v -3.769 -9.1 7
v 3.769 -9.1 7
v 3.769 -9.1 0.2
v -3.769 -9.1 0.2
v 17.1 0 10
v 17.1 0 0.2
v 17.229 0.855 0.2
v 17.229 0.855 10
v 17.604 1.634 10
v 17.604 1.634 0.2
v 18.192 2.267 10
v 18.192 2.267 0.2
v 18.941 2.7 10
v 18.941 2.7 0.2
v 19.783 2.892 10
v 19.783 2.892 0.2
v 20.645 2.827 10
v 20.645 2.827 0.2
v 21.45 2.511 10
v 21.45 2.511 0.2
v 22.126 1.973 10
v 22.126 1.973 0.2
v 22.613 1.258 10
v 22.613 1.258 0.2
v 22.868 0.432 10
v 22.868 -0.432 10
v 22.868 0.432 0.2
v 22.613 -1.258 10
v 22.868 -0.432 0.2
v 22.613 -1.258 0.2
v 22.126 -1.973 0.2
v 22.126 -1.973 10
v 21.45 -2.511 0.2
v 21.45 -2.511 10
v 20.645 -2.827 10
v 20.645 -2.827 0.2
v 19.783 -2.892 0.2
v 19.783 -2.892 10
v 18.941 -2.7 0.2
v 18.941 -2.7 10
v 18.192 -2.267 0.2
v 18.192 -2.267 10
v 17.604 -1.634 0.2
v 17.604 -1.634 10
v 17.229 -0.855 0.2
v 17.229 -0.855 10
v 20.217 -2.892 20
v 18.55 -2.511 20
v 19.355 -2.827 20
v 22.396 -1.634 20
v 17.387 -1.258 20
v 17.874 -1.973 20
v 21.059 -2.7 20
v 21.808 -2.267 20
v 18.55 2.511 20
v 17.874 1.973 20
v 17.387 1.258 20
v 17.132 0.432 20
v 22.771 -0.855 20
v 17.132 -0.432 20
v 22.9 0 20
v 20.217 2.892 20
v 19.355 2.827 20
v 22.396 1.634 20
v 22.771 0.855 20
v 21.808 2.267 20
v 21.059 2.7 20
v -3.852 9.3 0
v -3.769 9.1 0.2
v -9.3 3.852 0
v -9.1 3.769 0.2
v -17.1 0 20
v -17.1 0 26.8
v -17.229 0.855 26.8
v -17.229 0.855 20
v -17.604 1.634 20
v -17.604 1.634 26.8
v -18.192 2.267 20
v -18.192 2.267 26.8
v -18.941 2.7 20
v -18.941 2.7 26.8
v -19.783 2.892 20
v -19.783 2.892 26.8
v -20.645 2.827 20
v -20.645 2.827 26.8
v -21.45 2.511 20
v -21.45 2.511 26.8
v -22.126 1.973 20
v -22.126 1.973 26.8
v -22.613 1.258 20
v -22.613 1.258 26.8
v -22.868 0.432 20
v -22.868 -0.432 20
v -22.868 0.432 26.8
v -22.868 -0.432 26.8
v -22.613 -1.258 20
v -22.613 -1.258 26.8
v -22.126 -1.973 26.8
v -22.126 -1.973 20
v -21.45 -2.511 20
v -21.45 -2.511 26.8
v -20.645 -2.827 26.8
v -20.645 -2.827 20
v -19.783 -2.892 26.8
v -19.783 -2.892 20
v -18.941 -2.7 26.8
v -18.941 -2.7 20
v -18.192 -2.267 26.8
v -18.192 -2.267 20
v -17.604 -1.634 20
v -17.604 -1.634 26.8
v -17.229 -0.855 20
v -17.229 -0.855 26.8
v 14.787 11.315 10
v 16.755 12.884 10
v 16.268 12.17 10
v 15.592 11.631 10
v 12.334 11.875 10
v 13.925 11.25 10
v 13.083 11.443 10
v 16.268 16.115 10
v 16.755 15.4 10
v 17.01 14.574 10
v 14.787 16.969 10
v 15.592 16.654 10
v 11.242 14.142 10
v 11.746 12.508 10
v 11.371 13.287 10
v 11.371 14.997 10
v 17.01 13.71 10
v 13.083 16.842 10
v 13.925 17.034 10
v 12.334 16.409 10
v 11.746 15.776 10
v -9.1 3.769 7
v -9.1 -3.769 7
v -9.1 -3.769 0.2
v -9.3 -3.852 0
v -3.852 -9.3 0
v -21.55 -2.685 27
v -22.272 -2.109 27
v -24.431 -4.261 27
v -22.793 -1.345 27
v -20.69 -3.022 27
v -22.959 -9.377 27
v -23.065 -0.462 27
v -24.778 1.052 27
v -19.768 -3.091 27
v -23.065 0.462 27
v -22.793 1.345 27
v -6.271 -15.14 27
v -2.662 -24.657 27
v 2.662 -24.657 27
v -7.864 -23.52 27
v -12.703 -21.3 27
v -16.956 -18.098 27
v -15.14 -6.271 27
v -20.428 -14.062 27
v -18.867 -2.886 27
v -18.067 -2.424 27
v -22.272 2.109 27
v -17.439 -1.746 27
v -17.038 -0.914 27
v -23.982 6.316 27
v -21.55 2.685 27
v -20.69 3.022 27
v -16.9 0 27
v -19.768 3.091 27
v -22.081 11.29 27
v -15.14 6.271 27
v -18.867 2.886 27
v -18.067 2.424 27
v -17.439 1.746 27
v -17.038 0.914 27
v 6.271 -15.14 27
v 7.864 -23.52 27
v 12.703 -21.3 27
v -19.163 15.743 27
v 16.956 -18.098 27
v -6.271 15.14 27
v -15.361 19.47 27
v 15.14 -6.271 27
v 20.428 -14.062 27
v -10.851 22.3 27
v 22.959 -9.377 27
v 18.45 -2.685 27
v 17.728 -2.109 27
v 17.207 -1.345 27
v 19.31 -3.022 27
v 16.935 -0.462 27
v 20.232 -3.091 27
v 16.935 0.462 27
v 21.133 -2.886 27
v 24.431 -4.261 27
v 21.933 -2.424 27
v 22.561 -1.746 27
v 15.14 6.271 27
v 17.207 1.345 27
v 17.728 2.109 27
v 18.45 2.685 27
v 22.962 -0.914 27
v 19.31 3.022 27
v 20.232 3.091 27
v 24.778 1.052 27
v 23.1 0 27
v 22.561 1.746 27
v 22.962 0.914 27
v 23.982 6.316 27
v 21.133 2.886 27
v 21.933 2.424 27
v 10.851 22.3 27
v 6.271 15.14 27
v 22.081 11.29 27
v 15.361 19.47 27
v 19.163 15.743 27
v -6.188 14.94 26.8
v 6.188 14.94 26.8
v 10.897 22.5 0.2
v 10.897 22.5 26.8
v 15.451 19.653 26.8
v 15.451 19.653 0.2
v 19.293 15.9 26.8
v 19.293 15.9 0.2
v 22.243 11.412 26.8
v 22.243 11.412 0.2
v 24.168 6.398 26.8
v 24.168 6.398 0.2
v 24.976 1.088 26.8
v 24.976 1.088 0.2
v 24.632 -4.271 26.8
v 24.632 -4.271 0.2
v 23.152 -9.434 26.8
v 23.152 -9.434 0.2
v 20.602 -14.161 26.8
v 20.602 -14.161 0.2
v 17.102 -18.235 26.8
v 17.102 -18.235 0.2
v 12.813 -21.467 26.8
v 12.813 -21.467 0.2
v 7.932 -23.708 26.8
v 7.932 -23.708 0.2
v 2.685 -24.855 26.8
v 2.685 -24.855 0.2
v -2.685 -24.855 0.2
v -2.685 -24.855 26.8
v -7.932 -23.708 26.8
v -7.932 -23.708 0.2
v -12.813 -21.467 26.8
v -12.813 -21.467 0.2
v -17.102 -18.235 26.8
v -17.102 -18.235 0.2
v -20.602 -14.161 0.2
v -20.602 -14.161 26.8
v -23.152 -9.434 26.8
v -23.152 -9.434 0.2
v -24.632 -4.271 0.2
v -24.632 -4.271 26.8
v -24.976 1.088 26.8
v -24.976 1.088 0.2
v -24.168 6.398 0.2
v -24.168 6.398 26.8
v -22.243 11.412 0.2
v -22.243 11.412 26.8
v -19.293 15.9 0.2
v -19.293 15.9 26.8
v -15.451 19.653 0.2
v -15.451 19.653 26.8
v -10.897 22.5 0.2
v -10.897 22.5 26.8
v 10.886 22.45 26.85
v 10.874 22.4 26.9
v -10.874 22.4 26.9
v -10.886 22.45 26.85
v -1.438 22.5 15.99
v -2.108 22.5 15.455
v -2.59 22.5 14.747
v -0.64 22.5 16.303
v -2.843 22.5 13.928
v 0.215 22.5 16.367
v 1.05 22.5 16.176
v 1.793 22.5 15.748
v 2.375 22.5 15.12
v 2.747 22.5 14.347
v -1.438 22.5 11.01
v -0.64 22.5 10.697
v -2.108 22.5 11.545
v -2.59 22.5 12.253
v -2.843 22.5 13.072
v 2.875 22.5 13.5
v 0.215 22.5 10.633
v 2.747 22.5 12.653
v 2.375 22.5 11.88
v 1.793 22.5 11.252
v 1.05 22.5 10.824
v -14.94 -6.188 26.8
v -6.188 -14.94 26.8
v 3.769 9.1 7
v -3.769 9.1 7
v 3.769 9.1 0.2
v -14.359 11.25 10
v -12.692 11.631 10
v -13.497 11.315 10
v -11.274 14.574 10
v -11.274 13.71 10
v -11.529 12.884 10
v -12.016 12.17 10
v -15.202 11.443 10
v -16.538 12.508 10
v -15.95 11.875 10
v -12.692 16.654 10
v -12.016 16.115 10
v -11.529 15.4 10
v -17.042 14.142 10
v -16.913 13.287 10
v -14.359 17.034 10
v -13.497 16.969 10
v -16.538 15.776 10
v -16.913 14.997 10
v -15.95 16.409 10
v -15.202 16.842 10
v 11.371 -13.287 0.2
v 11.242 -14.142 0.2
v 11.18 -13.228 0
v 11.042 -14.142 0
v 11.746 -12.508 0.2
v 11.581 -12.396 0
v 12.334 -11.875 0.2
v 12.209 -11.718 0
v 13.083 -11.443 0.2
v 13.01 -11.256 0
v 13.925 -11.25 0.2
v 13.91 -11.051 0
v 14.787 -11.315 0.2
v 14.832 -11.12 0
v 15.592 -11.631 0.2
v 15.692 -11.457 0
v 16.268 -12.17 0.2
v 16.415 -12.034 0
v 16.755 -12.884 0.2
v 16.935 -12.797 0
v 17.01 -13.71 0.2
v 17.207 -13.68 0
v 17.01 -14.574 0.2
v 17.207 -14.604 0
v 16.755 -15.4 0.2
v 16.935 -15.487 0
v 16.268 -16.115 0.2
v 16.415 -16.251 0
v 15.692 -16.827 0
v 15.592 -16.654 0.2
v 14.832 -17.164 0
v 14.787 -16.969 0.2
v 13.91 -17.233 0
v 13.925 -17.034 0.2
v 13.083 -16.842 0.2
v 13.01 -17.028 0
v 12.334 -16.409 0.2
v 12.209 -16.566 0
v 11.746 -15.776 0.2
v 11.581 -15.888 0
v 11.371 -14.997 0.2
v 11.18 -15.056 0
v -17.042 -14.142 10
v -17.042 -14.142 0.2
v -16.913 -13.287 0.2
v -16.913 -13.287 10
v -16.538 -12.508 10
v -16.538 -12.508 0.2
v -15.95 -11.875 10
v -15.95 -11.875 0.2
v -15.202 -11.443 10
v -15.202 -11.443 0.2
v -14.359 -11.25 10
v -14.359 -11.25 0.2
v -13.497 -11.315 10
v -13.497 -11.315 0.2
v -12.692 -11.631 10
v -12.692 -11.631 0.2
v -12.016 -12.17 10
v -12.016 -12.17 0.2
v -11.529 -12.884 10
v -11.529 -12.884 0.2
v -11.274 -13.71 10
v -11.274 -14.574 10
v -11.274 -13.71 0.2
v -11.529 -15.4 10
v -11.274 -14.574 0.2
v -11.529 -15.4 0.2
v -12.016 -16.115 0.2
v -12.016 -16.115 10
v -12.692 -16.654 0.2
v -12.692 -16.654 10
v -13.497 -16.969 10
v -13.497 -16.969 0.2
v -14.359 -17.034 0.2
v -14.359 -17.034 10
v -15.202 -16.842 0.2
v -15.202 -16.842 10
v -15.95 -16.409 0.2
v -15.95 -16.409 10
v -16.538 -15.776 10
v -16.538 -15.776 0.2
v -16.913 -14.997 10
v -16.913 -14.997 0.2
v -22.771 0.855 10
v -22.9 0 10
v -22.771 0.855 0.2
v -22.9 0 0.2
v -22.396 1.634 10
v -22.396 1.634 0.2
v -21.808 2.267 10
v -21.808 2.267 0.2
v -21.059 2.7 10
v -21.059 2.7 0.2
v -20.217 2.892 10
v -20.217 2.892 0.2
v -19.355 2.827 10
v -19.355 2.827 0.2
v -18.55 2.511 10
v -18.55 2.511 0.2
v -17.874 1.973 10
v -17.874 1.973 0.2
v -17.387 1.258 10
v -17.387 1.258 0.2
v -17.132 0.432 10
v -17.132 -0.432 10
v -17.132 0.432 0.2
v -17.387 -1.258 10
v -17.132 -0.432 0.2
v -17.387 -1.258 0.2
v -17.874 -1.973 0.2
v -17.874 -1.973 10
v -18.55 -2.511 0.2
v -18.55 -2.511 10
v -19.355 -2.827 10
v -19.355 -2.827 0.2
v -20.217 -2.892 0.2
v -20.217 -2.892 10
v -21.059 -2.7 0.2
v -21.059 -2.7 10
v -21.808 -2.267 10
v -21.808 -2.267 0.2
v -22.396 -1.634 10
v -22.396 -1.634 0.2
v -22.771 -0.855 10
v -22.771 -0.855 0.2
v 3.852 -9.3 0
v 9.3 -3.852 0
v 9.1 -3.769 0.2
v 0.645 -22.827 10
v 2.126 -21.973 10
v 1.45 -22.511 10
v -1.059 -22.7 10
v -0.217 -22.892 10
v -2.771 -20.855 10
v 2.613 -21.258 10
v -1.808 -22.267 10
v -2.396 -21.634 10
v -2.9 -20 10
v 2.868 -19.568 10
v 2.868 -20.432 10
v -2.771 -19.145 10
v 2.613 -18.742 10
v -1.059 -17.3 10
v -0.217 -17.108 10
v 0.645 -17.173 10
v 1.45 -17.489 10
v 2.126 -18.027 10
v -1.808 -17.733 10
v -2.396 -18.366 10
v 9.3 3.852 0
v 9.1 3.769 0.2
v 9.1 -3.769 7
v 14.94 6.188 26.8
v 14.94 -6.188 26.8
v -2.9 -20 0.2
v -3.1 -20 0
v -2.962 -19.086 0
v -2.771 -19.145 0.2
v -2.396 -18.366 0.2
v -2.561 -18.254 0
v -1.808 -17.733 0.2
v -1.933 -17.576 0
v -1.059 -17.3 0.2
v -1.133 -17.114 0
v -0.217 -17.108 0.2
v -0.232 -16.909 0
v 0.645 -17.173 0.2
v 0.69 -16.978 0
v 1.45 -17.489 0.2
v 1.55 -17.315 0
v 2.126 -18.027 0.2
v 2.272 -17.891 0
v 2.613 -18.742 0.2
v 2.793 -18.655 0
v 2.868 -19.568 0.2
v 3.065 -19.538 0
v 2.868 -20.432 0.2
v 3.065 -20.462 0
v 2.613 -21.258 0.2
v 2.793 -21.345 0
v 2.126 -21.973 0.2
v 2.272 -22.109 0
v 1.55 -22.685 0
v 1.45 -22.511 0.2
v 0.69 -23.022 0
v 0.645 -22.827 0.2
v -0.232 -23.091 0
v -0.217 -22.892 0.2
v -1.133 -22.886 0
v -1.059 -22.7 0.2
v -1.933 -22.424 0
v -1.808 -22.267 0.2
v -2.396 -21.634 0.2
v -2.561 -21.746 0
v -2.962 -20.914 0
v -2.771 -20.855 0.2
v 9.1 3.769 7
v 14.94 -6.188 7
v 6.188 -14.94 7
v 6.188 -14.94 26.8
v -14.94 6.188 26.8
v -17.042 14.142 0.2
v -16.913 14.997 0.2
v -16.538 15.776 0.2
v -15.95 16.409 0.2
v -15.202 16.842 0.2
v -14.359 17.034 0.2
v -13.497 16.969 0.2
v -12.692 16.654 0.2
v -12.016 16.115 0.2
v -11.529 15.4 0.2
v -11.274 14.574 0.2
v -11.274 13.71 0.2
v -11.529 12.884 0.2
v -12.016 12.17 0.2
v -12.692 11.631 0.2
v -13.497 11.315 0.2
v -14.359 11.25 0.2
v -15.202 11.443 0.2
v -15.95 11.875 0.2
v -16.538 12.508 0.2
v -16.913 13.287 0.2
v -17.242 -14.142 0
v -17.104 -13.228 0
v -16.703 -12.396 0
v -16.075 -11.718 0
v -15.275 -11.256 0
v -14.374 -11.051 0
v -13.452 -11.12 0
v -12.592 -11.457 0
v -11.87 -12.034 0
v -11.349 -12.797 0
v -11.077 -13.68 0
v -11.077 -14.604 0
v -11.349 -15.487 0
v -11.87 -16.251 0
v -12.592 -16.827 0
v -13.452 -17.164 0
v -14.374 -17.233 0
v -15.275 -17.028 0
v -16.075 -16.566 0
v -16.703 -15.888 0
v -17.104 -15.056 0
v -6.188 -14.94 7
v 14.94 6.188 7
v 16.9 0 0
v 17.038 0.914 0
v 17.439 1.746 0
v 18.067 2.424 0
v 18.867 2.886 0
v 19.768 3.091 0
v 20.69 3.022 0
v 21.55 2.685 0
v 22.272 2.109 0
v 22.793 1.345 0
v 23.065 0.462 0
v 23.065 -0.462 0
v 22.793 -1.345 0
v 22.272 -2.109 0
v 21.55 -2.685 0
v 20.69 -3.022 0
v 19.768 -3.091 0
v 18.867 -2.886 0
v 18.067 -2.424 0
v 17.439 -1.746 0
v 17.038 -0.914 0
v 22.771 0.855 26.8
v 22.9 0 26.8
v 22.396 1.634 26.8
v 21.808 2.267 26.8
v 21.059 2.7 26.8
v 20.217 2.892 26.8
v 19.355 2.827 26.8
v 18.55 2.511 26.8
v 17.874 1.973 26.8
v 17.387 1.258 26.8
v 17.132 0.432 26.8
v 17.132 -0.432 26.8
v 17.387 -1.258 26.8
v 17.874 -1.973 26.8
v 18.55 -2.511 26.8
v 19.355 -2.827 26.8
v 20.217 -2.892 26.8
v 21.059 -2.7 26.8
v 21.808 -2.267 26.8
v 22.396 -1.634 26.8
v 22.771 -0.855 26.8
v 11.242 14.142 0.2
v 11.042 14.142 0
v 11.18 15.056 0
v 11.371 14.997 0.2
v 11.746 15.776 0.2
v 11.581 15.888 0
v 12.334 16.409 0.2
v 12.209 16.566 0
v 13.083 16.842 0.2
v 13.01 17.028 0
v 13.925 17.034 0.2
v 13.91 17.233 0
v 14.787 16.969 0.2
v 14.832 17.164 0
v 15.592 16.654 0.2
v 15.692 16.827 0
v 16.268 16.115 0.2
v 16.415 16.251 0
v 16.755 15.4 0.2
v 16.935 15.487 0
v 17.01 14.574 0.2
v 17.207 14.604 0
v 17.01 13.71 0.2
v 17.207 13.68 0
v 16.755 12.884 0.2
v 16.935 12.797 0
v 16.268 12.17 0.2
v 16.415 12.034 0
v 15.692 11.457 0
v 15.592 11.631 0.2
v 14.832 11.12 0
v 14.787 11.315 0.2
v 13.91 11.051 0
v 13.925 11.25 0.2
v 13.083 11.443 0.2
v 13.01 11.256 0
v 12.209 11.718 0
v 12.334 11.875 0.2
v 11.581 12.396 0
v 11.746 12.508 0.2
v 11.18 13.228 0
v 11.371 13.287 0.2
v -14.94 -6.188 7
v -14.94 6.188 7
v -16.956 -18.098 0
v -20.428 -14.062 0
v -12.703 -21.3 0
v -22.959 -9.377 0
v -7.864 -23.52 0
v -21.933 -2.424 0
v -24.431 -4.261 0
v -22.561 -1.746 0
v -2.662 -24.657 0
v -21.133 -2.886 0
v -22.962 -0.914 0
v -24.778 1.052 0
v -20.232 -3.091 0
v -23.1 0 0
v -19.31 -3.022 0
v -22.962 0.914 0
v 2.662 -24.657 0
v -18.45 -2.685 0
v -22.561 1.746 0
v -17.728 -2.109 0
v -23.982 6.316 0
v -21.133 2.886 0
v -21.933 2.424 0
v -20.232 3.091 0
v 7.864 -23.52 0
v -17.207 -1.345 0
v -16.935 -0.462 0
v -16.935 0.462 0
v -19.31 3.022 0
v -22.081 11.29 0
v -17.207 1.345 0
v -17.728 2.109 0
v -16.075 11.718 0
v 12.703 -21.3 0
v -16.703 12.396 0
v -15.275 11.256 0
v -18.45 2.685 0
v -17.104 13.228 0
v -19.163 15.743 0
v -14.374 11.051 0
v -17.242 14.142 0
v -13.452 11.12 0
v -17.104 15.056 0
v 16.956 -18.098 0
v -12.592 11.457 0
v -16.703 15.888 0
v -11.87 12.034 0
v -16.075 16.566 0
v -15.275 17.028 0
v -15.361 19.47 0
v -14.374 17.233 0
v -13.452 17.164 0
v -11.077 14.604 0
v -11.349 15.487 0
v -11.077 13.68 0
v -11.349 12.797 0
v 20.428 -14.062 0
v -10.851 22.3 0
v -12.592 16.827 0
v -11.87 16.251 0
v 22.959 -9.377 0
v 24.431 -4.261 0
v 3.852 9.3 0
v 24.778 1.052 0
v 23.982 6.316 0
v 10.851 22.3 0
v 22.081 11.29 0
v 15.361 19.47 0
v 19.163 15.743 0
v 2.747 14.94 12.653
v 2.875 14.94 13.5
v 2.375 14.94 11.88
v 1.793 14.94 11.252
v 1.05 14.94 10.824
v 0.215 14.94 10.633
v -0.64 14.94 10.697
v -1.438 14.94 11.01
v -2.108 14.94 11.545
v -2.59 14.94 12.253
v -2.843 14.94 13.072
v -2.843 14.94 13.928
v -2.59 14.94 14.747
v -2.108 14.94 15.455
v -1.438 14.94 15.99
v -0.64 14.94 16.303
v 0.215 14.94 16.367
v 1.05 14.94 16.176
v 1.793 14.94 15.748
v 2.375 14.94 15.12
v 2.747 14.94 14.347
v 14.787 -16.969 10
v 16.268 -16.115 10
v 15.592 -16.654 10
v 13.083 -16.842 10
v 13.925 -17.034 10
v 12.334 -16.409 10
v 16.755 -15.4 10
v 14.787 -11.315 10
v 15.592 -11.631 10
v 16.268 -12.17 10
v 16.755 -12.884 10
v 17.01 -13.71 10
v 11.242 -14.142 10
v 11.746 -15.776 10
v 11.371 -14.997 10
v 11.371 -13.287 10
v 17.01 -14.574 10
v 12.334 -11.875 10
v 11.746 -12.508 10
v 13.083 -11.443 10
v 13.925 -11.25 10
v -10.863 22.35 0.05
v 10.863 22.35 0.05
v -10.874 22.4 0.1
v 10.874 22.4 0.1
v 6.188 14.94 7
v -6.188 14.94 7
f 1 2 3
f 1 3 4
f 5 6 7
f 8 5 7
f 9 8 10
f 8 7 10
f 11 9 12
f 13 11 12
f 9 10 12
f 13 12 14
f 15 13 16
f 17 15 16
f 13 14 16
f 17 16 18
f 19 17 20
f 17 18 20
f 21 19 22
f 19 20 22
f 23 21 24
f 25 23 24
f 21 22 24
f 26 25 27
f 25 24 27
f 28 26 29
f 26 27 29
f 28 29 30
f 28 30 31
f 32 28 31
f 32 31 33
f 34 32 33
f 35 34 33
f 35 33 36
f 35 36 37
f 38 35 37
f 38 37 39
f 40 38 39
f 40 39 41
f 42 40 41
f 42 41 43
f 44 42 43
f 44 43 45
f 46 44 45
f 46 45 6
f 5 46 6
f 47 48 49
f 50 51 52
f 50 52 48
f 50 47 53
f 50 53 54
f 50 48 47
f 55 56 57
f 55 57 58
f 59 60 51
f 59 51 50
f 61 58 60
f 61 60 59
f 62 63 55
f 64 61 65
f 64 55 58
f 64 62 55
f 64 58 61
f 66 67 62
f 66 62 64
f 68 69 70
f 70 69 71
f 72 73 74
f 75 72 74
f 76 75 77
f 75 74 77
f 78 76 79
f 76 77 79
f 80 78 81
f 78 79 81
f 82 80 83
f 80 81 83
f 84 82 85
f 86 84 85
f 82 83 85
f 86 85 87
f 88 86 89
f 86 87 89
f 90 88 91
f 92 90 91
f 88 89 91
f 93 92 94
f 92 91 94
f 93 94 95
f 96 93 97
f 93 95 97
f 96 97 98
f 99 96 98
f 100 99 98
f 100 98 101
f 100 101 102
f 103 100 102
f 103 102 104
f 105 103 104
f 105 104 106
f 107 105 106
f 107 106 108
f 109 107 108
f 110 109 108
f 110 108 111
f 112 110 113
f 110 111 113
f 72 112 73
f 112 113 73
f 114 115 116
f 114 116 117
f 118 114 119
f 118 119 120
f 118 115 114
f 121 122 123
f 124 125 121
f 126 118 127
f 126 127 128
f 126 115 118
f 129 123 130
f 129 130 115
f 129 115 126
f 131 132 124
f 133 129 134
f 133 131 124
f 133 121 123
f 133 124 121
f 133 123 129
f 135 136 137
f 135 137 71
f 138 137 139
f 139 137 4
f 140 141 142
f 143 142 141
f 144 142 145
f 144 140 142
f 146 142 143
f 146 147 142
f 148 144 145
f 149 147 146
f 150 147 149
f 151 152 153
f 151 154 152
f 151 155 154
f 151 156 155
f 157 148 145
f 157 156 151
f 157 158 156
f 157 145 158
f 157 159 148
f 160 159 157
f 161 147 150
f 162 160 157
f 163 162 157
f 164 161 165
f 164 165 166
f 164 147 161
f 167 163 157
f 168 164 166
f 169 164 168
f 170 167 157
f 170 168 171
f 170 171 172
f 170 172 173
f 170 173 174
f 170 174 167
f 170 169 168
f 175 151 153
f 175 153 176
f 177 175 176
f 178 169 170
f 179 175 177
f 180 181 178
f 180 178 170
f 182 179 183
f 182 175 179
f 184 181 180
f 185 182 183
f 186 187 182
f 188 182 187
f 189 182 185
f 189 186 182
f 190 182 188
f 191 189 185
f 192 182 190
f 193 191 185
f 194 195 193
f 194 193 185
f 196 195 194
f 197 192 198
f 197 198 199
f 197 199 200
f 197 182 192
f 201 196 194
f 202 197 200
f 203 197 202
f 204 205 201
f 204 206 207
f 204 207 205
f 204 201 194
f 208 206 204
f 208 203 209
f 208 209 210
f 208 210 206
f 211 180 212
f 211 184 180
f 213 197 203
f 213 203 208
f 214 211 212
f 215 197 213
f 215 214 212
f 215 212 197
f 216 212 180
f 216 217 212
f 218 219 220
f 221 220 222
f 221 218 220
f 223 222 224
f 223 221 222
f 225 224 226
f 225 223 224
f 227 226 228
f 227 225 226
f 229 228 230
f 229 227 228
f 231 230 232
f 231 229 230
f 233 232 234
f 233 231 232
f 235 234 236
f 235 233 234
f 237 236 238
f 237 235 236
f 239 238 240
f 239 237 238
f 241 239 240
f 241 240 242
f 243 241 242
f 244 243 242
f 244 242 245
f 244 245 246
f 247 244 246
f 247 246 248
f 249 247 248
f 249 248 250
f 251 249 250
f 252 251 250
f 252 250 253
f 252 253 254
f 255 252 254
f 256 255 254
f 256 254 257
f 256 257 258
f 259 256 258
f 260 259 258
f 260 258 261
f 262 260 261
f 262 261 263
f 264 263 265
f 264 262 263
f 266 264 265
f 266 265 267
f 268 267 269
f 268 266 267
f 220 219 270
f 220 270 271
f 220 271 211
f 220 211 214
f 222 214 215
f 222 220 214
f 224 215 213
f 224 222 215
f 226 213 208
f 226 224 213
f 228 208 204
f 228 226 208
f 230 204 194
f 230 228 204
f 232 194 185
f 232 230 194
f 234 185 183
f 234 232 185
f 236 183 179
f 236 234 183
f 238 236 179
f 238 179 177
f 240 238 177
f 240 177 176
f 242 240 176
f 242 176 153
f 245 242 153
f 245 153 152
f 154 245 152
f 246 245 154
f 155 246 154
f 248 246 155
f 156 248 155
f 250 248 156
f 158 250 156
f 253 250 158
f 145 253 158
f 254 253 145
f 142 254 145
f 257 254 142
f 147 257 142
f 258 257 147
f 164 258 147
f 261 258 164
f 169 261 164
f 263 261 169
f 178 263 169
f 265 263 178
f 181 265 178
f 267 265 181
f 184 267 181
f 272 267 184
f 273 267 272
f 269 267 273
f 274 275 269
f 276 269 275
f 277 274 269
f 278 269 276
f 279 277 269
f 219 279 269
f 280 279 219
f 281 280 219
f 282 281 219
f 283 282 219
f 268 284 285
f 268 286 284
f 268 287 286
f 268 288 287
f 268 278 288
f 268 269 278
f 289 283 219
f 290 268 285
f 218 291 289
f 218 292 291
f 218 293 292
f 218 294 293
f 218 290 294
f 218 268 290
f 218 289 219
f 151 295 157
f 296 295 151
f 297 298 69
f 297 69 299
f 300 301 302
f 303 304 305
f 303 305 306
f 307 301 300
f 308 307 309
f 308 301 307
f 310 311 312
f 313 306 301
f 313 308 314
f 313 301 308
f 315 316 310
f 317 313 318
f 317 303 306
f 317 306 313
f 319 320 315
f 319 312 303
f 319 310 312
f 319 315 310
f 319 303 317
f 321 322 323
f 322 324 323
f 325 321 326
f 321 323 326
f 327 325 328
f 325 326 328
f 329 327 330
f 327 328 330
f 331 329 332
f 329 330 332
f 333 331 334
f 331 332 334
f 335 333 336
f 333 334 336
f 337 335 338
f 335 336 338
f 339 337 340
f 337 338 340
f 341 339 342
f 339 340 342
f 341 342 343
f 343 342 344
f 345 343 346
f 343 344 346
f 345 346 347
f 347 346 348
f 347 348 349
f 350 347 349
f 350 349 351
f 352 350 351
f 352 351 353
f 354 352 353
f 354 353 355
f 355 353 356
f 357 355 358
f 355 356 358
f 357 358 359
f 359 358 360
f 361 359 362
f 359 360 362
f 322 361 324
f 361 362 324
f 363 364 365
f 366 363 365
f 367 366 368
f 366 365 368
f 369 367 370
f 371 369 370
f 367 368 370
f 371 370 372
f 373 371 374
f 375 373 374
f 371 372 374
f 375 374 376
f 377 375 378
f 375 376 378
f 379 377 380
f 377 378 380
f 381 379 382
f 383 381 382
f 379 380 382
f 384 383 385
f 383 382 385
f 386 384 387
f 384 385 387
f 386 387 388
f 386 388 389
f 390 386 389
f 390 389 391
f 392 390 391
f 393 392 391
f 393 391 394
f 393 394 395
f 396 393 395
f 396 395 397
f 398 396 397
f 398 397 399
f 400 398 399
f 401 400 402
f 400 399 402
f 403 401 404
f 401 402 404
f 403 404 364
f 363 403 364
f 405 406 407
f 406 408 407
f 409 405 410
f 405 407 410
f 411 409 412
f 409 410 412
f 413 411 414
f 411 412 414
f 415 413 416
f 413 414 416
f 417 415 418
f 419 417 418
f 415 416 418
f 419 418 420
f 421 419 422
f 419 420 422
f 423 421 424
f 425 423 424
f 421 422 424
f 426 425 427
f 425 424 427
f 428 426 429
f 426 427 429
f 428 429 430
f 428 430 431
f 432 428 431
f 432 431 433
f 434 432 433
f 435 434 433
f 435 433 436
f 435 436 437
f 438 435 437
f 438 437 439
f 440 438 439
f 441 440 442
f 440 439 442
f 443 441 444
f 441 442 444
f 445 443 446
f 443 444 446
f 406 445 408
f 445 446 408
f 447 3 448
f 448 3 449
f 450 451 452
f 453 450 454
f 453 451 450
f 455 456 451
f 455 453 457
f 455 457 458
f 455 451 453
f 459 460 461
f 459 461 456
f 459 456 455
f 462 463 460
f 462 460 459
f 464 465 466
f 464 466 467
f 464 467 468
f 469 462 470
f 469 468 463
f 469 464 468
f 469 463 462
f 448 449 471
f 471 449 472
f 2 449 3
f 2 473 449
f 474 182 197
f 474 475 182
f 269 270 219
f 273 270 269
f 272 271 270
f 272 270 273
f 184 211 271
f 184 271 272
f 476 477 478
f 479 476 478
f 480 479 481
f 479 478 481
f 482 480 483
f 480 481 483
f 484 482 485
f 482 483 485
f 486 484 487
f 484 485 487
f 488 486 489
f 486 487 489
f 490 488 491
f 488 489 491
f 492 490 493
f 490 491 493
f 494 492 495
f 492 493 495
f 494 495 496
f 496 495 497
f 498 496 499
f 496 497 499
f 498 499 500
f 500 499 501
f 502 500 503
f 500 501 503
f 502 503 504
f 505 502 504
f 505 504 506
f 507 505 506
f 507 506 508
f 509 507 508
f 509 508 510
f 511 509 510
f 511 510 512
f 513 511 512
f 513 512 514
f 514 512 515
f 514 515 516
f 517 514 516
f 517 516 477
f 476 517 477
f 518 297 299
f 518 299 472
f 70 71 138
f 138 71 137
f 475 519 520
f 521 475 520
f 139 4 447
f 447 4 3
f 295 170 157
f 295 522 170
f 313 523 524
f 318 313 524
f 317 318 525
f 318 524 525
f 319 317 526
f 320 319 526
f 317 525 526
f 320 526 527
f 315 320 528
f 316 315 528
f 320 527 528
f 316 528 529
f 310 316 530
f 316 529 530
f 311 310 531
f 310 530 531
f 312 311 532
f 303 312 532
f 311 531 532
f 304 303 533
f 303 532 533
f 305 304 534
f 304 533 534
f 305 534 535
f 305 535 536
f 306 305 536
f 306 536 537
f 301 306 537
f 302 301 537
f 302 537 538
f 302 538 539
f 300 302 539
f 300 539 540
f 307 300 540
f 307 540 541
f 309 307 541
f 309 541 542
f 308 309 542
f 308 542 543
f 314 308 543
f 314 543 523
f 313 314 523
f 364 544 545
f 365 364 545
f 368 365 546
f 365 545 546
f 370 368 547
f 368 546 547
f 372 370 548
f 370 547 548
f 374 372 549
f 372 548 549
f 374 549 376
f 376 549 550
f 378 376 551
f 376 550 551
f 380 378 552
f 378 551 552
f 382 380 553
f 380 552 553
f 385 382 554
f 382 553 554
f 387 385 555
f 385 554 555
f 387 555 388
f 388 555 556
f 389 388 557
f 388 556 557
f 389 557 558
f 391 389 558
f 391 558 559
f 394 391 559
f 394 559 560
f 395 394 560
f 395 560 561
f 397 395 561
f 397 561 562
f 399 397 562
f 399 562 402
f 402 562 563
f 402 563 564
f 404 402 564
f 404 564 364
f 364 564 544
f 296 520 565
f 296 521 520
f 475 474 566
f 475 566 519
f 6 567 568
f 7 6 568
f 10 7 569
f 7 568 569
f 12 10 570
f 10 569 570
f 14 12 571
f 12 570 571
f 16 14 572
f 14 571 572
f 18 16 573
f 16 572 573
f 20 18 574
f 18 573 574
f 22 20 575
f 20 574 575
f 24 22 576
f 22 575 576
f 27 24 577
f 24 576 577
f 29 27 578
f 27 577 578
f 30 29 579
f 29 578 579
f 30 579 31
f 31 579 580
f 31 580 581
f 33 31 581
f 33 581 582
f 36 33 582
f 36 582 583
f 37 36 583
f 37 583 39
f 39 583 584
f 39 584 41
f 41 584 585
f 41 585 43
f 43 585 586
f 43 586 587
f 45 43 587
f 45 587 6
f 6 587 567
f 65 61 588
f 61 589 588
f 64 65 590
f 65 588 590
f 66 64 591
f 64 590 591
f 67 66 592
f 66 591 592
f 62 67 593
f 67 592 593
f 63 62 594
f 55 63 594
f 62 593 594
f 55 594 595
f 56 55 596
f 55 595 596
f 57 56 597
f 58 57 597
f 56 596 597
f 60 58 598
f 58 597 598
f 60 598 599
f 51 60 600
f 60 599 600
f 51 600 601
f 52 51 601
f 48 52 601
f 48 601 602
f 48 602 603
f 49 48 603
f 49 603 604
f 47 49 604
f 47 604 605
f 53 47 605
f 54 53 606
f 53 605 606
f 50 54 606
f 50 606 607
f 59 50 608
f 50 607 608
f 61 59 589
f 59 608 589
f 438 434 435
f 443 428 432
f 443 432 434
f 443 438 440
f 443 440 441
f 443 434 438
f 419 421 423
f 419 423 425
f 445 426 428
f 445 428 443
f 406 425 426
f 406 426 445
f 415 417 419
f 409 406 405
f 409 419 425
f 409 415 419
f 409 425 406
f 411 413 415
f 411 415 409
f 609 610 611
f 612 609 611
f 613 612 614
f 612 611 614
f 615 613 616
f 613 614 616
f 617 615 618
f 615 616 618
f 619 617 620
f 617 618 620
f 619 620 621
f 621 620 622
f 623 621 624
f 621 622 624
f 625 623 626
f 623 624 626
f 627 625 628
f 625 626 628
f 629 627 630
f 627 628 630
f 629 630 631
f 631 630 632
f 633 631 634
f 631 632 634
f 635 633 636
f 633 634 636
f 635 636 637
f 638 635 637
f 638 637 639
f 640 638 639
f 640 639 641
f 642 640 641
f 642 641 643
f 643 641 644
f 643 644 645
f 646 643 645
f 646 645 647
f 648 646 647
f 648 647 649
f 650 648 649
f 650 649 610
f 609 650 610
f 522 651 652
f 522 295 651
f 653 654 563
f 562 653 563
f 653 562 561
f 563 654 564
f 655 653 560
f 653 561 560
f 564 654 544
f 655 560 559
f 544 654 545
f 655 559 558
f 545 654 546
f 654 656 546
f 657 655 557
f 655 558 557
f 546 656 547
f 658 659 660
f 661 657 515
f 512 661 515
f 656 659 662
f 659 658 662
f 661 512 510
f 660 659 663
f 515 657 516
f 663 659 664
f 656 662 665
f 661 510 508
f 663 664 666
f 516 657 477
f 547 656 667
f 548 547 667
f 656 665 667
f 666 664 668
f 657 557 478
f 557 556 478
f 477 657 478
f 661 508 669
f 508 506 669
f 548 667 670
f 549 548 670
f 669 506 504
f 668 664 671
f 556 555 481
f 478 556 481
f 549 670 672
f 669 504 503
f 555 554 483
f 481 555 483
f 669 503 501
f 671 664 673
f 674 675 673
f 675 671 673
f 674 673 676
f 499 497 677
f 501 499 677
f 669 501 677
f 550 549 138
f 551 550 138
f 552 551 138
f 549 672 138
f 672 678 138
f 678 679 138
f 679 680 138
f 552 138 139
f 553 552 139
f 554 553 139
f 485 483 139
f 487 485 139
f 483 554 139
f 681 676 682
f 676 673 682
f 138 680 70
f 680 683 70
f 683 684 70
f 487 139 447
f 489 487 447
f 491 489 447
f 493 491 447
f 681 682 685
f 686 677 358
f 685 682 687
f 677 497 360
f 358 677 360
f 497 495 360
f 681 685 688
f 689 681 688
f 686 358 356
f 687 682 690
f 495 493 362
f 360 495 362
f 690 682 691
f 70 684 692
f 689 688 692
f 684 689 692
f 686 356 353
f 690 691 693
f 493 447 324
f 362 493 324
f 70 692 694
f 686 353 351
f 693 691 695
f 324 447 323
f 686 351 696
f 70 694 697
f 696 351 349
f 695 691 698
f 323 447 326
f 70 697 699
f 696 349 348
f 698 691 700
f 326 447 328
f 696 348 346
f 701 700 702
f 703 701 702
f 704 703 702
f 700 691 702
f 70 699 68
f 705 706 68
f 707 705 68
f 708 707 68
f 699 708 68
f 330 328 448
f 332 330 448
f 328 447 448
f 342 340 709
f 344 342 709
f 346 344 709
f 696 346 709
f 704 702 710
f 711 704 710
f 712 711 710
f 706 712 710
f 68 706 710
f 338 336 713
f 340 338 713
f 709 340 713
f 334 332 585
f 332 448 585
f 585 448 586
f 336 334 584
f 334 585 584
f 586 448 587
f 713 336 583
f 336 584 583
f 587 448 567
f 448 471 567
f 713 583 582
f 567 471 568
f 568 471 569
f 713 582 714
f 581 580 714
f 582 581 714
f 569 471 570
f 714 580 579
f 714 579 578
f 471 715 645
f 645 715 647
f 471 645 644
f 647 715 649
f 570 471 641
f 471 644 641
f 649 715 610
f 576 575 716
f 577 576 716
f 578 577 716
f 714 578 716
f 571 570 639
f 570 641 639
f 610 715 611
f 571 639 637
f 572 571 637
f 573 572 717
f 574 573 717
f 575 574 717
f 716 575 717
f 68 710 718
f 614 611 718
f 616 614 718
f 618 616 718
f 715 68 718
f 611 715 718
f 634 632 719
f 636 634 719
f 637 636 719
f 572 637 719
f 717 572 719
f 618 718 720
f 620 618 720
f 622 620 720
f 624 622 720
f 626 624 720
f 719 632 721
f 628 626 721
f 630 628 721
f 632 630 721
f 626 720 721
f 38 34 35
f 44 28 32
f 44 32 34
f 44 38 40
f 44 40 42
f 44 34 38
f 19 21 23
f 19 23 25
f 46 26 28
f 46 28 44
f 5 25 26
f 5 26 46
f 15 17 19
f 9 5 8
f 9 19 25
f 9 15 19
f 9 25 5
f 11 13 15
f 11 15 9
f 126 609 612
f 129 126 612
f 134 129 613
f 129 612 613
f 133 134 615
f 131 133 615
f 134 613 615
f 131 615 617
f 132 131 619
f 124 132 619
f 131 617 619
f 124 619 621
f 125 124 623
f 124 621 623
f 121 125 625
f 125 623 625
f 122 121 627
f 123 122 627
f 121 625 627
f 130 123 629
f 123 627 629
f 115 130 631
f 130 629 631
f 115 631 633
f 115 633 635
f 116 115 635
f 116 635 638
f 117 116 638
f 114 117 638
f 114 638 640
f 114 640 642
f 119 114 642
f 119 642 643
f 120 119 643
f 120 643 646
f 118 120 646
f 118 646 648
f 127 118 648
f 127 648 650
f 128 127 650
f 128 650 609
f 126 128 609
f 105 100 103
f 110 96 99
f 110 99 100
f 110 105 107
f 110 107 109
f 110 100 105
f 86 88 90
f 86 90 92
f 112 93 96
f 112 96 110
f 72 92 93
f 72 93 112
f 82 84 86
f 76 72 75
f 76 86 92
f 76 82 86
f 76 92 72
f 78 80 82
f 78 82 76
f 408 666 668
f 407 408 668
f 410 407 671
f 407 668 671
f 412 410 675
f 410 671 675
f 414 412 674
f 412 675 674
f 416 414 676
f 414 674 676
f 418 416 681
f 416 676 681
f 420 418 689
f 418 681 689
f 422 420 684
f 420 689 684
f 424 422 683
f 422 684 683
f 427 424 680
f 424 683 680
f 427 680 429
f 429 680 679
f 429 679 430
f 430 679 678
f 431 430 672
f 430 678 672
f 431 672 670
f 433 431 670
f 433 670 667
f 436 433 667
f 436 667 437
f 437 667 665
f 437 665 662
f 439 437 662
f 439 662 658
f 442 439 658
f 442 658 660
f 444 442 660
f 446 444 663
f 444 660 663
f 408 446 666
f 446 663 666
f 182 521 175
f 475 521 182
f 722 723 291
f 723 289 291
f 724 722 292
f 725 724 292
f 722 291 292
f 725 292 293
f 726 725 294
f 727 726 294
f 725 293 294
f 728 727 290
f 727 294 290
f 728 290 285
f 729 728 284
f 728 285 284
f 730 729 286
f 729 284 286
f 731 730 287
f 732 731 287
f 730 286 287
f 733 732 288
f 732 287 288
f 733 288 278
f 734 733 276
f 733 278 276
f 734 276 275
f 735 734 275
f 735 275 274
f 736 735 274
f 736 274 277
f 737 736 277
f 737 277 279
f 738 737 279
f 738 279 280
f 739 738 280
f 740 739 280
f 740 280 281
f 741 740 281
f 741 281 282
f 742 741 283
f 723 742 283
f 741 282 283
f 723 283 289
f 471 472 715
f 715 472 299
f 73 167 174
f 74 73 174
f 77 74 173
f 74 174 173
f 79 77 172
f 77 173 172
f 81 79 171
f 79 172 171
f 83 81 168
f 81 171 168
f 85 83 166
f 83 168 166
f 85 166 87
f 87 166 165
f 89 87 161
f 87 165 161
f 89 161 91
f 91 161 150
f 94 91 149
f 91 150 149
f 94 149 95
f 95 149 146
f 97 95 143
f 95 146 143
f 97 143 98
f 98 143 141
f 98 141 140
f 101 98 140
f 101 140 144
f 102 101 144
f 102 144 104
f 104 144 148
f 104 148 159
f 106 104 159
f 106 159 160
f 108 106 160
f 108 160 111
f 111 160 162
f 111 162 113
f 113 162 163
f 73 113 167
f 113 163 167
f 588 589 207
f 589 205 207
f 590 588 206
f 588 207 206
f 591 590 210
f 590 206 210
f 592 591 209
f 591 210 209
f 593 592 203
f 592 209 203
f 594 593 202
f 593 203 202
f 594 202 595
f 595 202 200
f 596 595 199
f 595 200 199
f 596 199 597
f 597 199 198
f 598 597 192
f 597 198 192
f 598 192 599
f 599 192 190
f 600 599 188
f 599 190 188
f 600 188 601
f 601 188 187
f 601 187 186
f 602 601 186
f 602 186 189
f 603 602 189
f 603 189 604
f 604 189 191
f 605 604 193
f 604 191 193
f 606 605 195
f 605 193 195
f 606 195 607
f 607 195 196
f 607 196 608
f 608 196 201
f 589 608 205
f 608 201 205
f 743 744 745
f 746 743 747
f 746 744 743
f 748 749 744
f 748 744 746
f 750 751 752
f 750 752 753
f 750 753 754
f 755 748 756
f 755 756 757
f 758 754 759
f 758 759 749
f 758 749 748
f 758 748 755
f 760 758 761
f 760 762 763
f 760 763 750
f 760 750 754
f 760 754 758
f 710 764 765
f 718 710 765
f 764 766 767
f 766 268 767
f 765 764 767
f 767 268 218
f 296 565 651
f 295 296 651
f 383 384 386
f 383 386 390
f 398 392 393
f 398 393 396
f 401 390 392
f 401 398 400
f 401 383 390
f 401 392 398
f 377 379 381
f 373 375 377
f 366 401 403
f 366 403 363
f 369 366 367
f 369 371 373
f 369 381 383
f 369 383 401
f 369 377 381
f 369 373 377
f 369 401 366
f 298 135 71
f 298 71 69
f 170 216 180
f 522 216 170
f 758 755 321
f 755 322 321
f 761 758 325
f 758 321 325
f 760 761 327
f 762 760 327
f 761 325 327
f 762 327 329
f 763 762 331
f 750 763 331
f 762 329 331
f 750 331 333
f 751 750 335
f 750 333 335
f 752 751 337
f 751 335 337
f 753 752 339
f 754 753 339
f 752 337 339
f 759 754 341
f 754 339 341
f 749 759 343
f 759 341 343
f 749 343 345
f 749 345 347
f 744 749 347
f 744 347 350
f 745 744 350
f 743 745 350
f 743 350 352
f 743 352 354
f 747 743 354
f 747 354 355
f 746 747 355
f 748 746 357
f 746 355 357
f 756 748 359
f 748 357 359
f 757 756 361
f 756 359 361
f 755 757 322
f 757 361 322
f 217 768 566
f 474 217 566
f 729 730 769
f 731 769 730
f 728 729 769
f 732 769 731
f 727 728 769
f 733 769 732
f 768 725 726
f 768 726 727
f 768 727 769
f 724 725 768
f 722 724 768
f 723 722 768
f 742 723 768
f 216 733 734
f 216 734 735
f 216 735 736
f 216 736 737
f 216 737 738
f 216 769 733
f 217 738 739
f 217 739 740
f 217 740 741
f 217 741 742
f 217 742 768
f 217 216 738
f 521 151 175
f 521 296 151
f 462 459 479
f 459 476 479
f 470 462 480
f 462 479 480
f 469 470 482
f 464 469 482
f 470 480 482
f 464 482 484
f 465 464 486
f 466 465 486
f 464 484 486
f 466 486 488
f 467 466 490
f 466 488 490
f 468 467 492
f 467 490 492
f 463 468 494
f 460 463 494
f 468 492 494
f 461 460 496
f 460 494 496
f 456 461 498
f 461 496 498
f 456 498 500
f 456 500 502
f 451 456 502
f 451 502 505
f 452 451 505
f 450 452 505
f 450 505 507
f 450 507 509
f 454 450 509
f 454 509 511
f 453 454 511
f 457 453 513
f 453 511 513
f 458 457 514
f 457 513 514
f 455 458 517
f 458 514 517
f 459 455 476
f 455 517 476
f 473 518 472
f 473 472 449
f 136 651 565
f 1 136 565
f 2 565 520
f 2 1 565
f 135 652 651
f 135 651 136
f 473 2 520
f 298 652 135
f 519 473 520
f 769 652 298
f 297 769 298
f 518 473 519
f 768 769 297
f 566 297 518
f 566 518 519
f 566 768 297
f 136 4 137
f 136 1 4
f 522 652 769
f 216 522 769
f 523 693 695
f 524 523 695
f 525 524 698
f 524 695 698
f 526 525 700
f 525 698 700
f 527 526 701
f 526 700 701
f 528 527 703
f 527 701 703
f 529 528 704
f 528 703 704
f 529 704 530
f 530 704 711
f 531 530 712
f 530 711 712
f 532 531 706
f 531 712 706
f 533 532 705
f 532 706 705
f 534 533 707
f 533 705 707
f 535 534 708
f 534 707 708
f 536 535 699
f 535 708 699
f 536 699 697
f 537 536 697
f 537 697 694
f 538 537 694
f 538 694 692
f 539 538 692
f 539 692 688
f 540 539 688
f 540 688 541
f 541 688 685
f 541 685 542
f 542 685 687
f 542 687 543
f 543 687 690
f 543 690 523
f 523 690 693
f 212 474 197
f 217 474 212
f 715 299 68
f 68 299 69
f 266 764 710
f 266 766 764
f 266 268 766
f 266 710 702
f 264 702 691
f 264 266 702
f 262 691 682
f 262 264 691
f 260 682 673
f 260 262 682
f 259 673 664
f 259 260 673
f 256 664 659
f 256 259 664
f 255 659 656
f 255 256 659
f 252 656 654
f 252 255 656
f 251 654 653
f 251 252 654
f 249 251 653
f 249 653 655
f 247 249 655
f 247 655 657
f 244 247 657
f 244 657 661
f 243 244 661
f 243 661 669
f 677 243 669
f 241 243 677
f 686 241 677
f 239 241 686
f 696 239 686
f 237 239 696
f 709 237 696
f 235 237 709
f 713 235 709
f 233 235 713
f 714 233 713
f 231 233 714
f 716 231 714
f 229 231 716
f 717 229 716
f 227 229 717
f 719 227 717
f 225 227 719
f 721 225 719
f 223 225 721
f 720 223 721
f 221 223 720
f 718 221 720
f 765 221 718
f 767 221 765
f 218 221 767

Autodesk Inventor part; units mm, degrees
ref_plane "YZ Plane" through (0, 0, 0) normal (1, 0, 0) x (0, 1, 0)
ref_plane "XZ Plane" through (0, 0, 0) normal (0, 1, 0) x (-1, 0, 0)
ref_plane "XY Plane" through (0, 0, 0) normal (0, 0, 1) x (1, 0, 0)
sketch "Sketch2" plane through (0, 0, 0) normal (0, 0, 1) x (1, 0, 0)
  circle A0 centre (0, 0) radius 25
  line L0 (-17.0079, 22.5) -> (27.1684, 22.5)
  point P0 (10.8972, 22.5)
  point P1 (-10.8972, 22.5)
  dimension "d4" = 50
  dimension "d5" = 22.5
extrude "Extrusion2" add sketch "Sketch2" along normal blind 27 contours A0 L0 picked at (1.1654, 4.7055)
sketch "Sketch3" plane through (-10.8972, 22.5, 0) normal (0, 1, 0) x (1, 0, 0)
  circle A0 centre (10.8972, -13.5) radius 2.875
  line L0 (0, 0) -> (0, -27) projected
  line L1 (21.7945, 0) -> (21.7945, -27) projected
  line L2 (21.7945, 0) -> (0, 0) projected
  point P0 (10.8972, 0)
  dimension "d8" = 5.75
  dimension "d9" = 10.8972
  dimension "d10" = 21.7945
  dimension "d11" = 27
  dimension "d12" = 13.5
extrude "Extrusion3" cut sketch "Sketch3" against normal blind 15
sketch "Sketch4" plane through (0, 0, 27) normal (0, 0, 1) x (1, 0, 0)
  line L0 (6.2132, -15) -> (15, -6.2132)
  line L1 (-6.2132, -15) -> (6.2132, -15)
  line L2 (-15, -6.2132) -> (-6.2132, -15)
  line L3 (-15, 6.2132) -> (-15, -6.2132)
  line L4 (-6.2132, 15) -> (-15, 6.2132)
  line L5 (6.2132, 15) -> (-6.2132, 15)
  line L6 (15, 6.2132) -> (6.2132, 15)
  line L7 (15, -6.2132) -> (15, 6.2132)
  line L8 (-6.1884, 14.94) -> (6.1884, 14.94)
  line L9 (6.1884, 14.94) -> (14.94, 6.1884)
  line L10 (14.94, 6.1884) -> (14.94, -6.1884)
  line L11 (14.94, -6.1884) -> (6.1884, -14.94)
  line L12 (6.1884, -14.94) -> (-6.1884, -14.94)
  line L13 (-6.1884, -14.94) -> (-14.94, -6.1884)
  line L14 (-14.94, -6.1884) -> (-14.94, 6.1884)
  line L15 (-14.94, 6.1884) -> (-6.1884, 14.94)
  point P0 (0, 0)
  point P1 (0, 0)
  dimension "d47" = 29.88
  dimension "d48" = 14.94
  dimension "d49" = 14.94
  dimension "d50" = 29.88
extrude "Extrusion4" cut sketch "Sketch4" against normal blind 20 contours L8 L9 L10 L11 L12 L13 L14 L15
sketch "Sketch6" plane through (0, 0, 27) normal (0, 0, 1) x (1, 0, 0)
  line L0 (-15.1, 6.2546) -> (-6.2546, 15.1) projected
  line L1 (-15.1, -6.2546) -> (-15.1, 6.2546) projected
  line L2 (-6.2546, -15.1) -> (-15.1, -6.2546) projected
  line L3 (6.2546, -15.1) -> (-6.2546, -15.1) projected
  line L4 (15.1, -6.2546) -> (6.2546, -15.1) projected
  line L5 (15.1, 6.2546) -> (15.1, -6.2546) projected
  line L6 (6.2546, 15.1) -> (15.1, 6.2546) projected
  line L7 (-6.2546, 15.1) -> (6.2546, 15.1) projected
  line L8 (0, 0) -> (33.369, 0)
  circle A0 centre (0, 0) radius 20
  circle A1 centre (20, 0) radius 2.9
  circle A2 centre (-20, 0) radius 2.9
  dimension "d20" = 40
  dimension "d21" = 5.8
  dimension "d24" = 360
extrude "Extrusion6" cut sketch "Sketch6" against normal blind 7 contours A1 A0 L8 | L8 A0 A1 | A0 A1 L8 | L8 A1 A0 | A2 A0 | A0 A2
sketch "Sketch7" plane through (0, 0, 0) normal (0, 0, -1) x (-1, 0, 0)
  line L0 (0, 0) -> (41.4197, 0)
  circle A0 centre (20, 0) radius 2.9 projected
  circle A1 centre (20, 0) radius 2.9
  circle A2 centre (14.1421, 14.1421) radius 2.9
  circle A3 centre (0, 20) radius 2.9
  circle A4 centre (-14.1421, 14.1421) radius 2.9
  circle A5 centre (-20, 0) radius 2.9
  circle A6 centre (-14.1421, -14.1421) radius 2.9
  circle A7 centre (0, -20) radius 2.9
  circle A8 centre (14.1421, -14.1421) radius 2.9
  dimension "d30" = 360
extrude "Extrusion7" cut sketch "Sketch7" against normal blind 10 contours A0 L0 | L0 A0 | A2 | A4 | A5 | A6 | A7 | A8
sketch "Sketch8" plane through (0, 0, 7) normal (0, 0, 1) x (1, 0, 0)
  line L0 (-15.1, 6.2546) -> (-6.2546, 15.1) projected
  line L1 (-15.1, -6.2546) -> (-15.1, 6.2546) projected
  line L2 (-6.2546, -15.1) -> (-15.1, -6.2546) projected
  line L3 (6.2546, -15.1) -> (-6.2546, -15.1) projected
  line L4 (15.1, -6.2546) -> (6.2546, -15.1) projected
  line L5 (15.1, 6.2546) -> (15.1, -6.2546) projected
  line L6 (6.2546, 15.1) -> (15.1, 6.2546) projected
  line L7 (-6.2546, 15.1) -> (6.2546, 15.1) projected
  line L8 (3.7693, 9.1) -> (9.1, 3.7693)
  line L9 (9.1, 3.7693) -> (9.1, -3.7693)
  line L10 (9.1, -3.7693) -> (3.7693, -9.1)
  line L11 (3.7693, -9.1) -> (-3.7693, -9.1)
  line L12 (-3.7693, -9.1) -> (-9.1, -3.7693)
  line L13 (-9.1, -3.7693) -> (-9.1, 3.7693)
  line L14 (-9.1, 3.7693) -> (-3.7693, 9.1)
  line L15 (-3.7693, 9.1) -> (3.7693, 9.1)
  point P0 (0, 0)
  dimension "d34" = 6
extrude "Extrusion8" cut sketch "Sketch8" against normal through all contours L8 L9 L10 L11 L12 L13 L14 L15
chamfer "Chamfer1" distance 0.2 angle 45 8 edges at (9.1, 0, 0) (6.4347, 6.4347, 0) (0, 9.1, 0) (-6.4347, 6.4347, 0) (-9.1, 0, 0) (-6.4347, -6.4347, 0) (0, -9.1, 0) (6.4347, -6.4347, 0)
chamfer "Chamfer2" distance 0.2 angle 45 9 edges at (17.0421, 14.1421, 0) (-11.2421, 14.1421, 0) (-17.1, 0, 0) (-11.2421, -14.1421, 0) (2.9, -20, 0) (17.0421, -14.1421, 0) (22.9, 0, 0) (-22.9, 0, 27) (17.1, 0, 27)
chamfer "Chamfer3" distance 0.2 angle 45 4 edges at (0, -25, 0) (0, 22.5, 0) (0, -25, 27) (0, 22.5, 27)
chamfer "Chamfer4" distance 0.2 angle 45 8 edges at (0, 14.94, 27) (10.5642, 10.5642, 27) (14.94, 0, 27) (10.5642, -10.5642, 27) (0, -14.94, 27) (-10.5642, -10.5642, 27) (-14.94, 0, 27) (-10.5642, 10.5642, 27)
equation "\"d9\" = 0.5 * d10"
equation "\"d12\" = 0.5 * d11"
equation "\"d48\" = 0.5 * d47"
equation "\"d49\" = 0.5 * d47"
equation "\"d50\" = d47"
properties part number "spool_center"
